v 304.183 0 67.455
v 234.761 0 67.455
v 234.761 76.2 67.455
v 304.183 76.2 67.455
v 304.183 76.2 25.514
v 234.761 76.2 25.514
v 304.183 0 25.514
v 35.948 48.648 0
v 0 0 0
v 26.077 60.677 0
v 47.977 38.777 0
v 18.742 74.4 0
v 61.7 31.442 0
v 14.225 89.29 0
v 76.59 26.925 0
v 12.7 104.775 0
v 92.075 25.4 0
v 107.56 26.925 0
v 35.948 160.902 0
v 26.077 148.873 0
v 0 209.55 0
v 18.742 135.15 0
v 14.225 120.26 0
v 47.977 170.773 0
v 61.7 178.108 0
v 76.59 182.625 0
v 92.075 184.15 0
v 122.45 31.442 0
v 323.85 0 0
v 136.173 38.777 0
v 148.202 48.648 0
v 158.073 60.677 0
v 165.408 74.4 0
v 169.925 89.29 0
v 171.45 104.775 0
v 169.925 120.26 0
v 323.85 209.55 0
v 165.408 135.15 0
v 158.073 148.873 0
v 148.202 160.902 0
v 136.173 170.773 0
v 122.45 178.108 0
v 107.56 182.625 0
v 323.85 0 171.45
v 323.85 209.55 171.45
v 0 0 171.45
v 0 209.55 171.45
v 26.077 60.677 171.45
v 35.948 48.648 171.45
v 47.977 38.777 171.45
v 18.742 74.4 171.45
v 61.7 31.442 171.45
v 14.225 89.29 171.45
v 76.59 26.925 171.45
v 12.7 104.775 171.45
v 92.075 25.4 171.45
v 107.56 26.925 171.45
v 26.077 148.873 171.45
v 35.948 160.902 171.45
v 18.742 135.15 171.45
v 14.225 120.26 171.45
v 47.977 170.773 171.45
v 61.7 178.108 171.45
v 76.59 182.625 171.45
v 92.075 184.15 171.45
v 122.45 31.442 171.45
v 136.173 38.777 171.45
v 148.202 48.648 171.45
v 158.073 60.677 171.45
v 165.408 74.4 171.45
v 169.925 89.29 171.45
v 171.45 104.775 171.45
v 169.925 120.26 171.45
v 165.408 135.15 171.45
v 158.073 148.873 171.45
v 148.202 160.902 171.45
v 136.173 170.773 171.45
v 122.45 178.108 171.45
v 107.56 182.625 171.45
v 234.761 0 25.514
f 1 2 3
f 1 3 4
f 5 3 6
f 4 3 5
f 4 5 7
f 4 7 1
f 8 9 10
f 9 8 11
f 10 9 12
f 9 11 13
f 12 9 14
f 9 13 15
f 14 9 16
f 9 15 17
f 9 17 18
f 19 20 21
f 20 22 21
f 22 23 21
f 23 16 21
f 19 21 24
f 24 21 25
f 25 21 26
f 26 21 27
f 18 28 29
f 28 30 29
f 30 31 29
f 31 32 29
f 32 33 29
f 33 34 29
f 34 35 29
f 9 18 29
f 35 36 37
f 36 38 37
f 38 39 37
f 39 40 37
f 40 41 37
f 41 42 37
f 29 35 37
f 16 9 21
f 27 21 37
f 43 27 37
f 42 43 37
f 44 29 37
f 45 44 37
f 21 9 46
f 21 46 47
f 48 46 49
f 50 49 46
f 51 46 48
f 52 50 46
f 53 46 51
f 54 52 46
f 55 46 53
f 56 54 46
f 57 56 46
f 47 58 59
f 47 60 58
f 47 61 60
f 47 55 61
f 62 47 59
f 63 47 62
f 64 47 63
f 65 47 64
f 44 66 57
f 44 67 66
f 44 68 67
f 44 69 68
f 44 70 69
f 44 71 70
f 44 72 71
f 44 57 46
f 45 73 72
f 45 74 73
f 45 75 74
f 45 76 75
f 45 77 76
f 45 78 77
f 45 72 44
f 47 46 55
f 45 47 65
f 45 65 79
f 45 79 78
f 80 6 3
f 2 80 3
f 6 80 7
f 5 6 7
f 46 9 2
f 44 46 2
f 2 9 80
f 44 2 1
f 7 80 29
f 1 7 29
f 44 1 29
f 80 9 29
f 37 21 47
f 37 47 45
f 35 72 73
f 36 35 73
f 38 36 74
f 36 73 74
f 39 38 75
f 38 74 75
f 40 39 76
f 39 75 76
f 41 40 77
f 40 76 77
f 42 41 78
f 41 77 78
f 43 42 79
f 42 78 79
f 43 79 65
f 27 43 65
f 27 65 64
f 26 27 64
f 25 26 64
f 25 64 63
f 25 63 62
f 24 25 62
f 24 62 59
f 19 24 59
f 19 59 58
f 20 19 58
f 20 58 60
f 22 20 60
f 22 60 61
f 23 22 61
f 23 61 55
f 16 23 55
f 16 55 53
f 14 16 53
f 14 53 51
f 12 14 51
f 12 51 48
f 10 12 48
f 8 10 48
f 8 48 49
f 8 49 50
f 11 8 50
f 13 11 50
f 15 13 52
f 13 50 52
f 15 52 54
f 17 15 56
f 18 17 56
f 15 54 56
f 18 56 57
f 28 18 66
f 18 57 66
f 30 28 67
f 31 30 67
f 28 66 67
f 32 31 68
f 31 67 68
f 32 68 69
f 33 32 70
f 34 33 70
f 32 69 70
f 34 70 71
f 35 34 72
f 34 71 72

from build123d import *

# Parameters (mm, degrees)
F0_W     = 323.85
F0_H     = 209.55
F1_DEPTH = 171.45
F2_R     = 79.375
F3_DEPTH = 171.451
F4_W     = 69.421232
F4_H     = 41.941766
F5_DEPTH = 76.2


with BuildPart() as f1:
    # F0 (on Top) → F1 (new body)
    with BuildSketch(Plane.XY):
        with Locations((161.925, 104.775)):
            Rectangle(F0_W, F0_H)
    extrude(amount=F1_DEPTH)

    # F2 (on face) → F3 (cut, through all)
    with BuildSketch(Plane.XY.offset(171.45)):
        with Locations((92.075, 104.775)):
            Circle(F2_R)
    extrude(amount=-F3_DEPTH, mode=Mode.SUBTRACT)

    # F4 (on face) → F5 (cut)
    with BuildSketch(Plane.XZ):
        with Locations((269.471973, 46.484394)):
            Rectangle(F4_W, F4_H)
    extrude(amount=-F5_DEPTH, mode=Mode.SUBTRACT)


solid = f1.part
